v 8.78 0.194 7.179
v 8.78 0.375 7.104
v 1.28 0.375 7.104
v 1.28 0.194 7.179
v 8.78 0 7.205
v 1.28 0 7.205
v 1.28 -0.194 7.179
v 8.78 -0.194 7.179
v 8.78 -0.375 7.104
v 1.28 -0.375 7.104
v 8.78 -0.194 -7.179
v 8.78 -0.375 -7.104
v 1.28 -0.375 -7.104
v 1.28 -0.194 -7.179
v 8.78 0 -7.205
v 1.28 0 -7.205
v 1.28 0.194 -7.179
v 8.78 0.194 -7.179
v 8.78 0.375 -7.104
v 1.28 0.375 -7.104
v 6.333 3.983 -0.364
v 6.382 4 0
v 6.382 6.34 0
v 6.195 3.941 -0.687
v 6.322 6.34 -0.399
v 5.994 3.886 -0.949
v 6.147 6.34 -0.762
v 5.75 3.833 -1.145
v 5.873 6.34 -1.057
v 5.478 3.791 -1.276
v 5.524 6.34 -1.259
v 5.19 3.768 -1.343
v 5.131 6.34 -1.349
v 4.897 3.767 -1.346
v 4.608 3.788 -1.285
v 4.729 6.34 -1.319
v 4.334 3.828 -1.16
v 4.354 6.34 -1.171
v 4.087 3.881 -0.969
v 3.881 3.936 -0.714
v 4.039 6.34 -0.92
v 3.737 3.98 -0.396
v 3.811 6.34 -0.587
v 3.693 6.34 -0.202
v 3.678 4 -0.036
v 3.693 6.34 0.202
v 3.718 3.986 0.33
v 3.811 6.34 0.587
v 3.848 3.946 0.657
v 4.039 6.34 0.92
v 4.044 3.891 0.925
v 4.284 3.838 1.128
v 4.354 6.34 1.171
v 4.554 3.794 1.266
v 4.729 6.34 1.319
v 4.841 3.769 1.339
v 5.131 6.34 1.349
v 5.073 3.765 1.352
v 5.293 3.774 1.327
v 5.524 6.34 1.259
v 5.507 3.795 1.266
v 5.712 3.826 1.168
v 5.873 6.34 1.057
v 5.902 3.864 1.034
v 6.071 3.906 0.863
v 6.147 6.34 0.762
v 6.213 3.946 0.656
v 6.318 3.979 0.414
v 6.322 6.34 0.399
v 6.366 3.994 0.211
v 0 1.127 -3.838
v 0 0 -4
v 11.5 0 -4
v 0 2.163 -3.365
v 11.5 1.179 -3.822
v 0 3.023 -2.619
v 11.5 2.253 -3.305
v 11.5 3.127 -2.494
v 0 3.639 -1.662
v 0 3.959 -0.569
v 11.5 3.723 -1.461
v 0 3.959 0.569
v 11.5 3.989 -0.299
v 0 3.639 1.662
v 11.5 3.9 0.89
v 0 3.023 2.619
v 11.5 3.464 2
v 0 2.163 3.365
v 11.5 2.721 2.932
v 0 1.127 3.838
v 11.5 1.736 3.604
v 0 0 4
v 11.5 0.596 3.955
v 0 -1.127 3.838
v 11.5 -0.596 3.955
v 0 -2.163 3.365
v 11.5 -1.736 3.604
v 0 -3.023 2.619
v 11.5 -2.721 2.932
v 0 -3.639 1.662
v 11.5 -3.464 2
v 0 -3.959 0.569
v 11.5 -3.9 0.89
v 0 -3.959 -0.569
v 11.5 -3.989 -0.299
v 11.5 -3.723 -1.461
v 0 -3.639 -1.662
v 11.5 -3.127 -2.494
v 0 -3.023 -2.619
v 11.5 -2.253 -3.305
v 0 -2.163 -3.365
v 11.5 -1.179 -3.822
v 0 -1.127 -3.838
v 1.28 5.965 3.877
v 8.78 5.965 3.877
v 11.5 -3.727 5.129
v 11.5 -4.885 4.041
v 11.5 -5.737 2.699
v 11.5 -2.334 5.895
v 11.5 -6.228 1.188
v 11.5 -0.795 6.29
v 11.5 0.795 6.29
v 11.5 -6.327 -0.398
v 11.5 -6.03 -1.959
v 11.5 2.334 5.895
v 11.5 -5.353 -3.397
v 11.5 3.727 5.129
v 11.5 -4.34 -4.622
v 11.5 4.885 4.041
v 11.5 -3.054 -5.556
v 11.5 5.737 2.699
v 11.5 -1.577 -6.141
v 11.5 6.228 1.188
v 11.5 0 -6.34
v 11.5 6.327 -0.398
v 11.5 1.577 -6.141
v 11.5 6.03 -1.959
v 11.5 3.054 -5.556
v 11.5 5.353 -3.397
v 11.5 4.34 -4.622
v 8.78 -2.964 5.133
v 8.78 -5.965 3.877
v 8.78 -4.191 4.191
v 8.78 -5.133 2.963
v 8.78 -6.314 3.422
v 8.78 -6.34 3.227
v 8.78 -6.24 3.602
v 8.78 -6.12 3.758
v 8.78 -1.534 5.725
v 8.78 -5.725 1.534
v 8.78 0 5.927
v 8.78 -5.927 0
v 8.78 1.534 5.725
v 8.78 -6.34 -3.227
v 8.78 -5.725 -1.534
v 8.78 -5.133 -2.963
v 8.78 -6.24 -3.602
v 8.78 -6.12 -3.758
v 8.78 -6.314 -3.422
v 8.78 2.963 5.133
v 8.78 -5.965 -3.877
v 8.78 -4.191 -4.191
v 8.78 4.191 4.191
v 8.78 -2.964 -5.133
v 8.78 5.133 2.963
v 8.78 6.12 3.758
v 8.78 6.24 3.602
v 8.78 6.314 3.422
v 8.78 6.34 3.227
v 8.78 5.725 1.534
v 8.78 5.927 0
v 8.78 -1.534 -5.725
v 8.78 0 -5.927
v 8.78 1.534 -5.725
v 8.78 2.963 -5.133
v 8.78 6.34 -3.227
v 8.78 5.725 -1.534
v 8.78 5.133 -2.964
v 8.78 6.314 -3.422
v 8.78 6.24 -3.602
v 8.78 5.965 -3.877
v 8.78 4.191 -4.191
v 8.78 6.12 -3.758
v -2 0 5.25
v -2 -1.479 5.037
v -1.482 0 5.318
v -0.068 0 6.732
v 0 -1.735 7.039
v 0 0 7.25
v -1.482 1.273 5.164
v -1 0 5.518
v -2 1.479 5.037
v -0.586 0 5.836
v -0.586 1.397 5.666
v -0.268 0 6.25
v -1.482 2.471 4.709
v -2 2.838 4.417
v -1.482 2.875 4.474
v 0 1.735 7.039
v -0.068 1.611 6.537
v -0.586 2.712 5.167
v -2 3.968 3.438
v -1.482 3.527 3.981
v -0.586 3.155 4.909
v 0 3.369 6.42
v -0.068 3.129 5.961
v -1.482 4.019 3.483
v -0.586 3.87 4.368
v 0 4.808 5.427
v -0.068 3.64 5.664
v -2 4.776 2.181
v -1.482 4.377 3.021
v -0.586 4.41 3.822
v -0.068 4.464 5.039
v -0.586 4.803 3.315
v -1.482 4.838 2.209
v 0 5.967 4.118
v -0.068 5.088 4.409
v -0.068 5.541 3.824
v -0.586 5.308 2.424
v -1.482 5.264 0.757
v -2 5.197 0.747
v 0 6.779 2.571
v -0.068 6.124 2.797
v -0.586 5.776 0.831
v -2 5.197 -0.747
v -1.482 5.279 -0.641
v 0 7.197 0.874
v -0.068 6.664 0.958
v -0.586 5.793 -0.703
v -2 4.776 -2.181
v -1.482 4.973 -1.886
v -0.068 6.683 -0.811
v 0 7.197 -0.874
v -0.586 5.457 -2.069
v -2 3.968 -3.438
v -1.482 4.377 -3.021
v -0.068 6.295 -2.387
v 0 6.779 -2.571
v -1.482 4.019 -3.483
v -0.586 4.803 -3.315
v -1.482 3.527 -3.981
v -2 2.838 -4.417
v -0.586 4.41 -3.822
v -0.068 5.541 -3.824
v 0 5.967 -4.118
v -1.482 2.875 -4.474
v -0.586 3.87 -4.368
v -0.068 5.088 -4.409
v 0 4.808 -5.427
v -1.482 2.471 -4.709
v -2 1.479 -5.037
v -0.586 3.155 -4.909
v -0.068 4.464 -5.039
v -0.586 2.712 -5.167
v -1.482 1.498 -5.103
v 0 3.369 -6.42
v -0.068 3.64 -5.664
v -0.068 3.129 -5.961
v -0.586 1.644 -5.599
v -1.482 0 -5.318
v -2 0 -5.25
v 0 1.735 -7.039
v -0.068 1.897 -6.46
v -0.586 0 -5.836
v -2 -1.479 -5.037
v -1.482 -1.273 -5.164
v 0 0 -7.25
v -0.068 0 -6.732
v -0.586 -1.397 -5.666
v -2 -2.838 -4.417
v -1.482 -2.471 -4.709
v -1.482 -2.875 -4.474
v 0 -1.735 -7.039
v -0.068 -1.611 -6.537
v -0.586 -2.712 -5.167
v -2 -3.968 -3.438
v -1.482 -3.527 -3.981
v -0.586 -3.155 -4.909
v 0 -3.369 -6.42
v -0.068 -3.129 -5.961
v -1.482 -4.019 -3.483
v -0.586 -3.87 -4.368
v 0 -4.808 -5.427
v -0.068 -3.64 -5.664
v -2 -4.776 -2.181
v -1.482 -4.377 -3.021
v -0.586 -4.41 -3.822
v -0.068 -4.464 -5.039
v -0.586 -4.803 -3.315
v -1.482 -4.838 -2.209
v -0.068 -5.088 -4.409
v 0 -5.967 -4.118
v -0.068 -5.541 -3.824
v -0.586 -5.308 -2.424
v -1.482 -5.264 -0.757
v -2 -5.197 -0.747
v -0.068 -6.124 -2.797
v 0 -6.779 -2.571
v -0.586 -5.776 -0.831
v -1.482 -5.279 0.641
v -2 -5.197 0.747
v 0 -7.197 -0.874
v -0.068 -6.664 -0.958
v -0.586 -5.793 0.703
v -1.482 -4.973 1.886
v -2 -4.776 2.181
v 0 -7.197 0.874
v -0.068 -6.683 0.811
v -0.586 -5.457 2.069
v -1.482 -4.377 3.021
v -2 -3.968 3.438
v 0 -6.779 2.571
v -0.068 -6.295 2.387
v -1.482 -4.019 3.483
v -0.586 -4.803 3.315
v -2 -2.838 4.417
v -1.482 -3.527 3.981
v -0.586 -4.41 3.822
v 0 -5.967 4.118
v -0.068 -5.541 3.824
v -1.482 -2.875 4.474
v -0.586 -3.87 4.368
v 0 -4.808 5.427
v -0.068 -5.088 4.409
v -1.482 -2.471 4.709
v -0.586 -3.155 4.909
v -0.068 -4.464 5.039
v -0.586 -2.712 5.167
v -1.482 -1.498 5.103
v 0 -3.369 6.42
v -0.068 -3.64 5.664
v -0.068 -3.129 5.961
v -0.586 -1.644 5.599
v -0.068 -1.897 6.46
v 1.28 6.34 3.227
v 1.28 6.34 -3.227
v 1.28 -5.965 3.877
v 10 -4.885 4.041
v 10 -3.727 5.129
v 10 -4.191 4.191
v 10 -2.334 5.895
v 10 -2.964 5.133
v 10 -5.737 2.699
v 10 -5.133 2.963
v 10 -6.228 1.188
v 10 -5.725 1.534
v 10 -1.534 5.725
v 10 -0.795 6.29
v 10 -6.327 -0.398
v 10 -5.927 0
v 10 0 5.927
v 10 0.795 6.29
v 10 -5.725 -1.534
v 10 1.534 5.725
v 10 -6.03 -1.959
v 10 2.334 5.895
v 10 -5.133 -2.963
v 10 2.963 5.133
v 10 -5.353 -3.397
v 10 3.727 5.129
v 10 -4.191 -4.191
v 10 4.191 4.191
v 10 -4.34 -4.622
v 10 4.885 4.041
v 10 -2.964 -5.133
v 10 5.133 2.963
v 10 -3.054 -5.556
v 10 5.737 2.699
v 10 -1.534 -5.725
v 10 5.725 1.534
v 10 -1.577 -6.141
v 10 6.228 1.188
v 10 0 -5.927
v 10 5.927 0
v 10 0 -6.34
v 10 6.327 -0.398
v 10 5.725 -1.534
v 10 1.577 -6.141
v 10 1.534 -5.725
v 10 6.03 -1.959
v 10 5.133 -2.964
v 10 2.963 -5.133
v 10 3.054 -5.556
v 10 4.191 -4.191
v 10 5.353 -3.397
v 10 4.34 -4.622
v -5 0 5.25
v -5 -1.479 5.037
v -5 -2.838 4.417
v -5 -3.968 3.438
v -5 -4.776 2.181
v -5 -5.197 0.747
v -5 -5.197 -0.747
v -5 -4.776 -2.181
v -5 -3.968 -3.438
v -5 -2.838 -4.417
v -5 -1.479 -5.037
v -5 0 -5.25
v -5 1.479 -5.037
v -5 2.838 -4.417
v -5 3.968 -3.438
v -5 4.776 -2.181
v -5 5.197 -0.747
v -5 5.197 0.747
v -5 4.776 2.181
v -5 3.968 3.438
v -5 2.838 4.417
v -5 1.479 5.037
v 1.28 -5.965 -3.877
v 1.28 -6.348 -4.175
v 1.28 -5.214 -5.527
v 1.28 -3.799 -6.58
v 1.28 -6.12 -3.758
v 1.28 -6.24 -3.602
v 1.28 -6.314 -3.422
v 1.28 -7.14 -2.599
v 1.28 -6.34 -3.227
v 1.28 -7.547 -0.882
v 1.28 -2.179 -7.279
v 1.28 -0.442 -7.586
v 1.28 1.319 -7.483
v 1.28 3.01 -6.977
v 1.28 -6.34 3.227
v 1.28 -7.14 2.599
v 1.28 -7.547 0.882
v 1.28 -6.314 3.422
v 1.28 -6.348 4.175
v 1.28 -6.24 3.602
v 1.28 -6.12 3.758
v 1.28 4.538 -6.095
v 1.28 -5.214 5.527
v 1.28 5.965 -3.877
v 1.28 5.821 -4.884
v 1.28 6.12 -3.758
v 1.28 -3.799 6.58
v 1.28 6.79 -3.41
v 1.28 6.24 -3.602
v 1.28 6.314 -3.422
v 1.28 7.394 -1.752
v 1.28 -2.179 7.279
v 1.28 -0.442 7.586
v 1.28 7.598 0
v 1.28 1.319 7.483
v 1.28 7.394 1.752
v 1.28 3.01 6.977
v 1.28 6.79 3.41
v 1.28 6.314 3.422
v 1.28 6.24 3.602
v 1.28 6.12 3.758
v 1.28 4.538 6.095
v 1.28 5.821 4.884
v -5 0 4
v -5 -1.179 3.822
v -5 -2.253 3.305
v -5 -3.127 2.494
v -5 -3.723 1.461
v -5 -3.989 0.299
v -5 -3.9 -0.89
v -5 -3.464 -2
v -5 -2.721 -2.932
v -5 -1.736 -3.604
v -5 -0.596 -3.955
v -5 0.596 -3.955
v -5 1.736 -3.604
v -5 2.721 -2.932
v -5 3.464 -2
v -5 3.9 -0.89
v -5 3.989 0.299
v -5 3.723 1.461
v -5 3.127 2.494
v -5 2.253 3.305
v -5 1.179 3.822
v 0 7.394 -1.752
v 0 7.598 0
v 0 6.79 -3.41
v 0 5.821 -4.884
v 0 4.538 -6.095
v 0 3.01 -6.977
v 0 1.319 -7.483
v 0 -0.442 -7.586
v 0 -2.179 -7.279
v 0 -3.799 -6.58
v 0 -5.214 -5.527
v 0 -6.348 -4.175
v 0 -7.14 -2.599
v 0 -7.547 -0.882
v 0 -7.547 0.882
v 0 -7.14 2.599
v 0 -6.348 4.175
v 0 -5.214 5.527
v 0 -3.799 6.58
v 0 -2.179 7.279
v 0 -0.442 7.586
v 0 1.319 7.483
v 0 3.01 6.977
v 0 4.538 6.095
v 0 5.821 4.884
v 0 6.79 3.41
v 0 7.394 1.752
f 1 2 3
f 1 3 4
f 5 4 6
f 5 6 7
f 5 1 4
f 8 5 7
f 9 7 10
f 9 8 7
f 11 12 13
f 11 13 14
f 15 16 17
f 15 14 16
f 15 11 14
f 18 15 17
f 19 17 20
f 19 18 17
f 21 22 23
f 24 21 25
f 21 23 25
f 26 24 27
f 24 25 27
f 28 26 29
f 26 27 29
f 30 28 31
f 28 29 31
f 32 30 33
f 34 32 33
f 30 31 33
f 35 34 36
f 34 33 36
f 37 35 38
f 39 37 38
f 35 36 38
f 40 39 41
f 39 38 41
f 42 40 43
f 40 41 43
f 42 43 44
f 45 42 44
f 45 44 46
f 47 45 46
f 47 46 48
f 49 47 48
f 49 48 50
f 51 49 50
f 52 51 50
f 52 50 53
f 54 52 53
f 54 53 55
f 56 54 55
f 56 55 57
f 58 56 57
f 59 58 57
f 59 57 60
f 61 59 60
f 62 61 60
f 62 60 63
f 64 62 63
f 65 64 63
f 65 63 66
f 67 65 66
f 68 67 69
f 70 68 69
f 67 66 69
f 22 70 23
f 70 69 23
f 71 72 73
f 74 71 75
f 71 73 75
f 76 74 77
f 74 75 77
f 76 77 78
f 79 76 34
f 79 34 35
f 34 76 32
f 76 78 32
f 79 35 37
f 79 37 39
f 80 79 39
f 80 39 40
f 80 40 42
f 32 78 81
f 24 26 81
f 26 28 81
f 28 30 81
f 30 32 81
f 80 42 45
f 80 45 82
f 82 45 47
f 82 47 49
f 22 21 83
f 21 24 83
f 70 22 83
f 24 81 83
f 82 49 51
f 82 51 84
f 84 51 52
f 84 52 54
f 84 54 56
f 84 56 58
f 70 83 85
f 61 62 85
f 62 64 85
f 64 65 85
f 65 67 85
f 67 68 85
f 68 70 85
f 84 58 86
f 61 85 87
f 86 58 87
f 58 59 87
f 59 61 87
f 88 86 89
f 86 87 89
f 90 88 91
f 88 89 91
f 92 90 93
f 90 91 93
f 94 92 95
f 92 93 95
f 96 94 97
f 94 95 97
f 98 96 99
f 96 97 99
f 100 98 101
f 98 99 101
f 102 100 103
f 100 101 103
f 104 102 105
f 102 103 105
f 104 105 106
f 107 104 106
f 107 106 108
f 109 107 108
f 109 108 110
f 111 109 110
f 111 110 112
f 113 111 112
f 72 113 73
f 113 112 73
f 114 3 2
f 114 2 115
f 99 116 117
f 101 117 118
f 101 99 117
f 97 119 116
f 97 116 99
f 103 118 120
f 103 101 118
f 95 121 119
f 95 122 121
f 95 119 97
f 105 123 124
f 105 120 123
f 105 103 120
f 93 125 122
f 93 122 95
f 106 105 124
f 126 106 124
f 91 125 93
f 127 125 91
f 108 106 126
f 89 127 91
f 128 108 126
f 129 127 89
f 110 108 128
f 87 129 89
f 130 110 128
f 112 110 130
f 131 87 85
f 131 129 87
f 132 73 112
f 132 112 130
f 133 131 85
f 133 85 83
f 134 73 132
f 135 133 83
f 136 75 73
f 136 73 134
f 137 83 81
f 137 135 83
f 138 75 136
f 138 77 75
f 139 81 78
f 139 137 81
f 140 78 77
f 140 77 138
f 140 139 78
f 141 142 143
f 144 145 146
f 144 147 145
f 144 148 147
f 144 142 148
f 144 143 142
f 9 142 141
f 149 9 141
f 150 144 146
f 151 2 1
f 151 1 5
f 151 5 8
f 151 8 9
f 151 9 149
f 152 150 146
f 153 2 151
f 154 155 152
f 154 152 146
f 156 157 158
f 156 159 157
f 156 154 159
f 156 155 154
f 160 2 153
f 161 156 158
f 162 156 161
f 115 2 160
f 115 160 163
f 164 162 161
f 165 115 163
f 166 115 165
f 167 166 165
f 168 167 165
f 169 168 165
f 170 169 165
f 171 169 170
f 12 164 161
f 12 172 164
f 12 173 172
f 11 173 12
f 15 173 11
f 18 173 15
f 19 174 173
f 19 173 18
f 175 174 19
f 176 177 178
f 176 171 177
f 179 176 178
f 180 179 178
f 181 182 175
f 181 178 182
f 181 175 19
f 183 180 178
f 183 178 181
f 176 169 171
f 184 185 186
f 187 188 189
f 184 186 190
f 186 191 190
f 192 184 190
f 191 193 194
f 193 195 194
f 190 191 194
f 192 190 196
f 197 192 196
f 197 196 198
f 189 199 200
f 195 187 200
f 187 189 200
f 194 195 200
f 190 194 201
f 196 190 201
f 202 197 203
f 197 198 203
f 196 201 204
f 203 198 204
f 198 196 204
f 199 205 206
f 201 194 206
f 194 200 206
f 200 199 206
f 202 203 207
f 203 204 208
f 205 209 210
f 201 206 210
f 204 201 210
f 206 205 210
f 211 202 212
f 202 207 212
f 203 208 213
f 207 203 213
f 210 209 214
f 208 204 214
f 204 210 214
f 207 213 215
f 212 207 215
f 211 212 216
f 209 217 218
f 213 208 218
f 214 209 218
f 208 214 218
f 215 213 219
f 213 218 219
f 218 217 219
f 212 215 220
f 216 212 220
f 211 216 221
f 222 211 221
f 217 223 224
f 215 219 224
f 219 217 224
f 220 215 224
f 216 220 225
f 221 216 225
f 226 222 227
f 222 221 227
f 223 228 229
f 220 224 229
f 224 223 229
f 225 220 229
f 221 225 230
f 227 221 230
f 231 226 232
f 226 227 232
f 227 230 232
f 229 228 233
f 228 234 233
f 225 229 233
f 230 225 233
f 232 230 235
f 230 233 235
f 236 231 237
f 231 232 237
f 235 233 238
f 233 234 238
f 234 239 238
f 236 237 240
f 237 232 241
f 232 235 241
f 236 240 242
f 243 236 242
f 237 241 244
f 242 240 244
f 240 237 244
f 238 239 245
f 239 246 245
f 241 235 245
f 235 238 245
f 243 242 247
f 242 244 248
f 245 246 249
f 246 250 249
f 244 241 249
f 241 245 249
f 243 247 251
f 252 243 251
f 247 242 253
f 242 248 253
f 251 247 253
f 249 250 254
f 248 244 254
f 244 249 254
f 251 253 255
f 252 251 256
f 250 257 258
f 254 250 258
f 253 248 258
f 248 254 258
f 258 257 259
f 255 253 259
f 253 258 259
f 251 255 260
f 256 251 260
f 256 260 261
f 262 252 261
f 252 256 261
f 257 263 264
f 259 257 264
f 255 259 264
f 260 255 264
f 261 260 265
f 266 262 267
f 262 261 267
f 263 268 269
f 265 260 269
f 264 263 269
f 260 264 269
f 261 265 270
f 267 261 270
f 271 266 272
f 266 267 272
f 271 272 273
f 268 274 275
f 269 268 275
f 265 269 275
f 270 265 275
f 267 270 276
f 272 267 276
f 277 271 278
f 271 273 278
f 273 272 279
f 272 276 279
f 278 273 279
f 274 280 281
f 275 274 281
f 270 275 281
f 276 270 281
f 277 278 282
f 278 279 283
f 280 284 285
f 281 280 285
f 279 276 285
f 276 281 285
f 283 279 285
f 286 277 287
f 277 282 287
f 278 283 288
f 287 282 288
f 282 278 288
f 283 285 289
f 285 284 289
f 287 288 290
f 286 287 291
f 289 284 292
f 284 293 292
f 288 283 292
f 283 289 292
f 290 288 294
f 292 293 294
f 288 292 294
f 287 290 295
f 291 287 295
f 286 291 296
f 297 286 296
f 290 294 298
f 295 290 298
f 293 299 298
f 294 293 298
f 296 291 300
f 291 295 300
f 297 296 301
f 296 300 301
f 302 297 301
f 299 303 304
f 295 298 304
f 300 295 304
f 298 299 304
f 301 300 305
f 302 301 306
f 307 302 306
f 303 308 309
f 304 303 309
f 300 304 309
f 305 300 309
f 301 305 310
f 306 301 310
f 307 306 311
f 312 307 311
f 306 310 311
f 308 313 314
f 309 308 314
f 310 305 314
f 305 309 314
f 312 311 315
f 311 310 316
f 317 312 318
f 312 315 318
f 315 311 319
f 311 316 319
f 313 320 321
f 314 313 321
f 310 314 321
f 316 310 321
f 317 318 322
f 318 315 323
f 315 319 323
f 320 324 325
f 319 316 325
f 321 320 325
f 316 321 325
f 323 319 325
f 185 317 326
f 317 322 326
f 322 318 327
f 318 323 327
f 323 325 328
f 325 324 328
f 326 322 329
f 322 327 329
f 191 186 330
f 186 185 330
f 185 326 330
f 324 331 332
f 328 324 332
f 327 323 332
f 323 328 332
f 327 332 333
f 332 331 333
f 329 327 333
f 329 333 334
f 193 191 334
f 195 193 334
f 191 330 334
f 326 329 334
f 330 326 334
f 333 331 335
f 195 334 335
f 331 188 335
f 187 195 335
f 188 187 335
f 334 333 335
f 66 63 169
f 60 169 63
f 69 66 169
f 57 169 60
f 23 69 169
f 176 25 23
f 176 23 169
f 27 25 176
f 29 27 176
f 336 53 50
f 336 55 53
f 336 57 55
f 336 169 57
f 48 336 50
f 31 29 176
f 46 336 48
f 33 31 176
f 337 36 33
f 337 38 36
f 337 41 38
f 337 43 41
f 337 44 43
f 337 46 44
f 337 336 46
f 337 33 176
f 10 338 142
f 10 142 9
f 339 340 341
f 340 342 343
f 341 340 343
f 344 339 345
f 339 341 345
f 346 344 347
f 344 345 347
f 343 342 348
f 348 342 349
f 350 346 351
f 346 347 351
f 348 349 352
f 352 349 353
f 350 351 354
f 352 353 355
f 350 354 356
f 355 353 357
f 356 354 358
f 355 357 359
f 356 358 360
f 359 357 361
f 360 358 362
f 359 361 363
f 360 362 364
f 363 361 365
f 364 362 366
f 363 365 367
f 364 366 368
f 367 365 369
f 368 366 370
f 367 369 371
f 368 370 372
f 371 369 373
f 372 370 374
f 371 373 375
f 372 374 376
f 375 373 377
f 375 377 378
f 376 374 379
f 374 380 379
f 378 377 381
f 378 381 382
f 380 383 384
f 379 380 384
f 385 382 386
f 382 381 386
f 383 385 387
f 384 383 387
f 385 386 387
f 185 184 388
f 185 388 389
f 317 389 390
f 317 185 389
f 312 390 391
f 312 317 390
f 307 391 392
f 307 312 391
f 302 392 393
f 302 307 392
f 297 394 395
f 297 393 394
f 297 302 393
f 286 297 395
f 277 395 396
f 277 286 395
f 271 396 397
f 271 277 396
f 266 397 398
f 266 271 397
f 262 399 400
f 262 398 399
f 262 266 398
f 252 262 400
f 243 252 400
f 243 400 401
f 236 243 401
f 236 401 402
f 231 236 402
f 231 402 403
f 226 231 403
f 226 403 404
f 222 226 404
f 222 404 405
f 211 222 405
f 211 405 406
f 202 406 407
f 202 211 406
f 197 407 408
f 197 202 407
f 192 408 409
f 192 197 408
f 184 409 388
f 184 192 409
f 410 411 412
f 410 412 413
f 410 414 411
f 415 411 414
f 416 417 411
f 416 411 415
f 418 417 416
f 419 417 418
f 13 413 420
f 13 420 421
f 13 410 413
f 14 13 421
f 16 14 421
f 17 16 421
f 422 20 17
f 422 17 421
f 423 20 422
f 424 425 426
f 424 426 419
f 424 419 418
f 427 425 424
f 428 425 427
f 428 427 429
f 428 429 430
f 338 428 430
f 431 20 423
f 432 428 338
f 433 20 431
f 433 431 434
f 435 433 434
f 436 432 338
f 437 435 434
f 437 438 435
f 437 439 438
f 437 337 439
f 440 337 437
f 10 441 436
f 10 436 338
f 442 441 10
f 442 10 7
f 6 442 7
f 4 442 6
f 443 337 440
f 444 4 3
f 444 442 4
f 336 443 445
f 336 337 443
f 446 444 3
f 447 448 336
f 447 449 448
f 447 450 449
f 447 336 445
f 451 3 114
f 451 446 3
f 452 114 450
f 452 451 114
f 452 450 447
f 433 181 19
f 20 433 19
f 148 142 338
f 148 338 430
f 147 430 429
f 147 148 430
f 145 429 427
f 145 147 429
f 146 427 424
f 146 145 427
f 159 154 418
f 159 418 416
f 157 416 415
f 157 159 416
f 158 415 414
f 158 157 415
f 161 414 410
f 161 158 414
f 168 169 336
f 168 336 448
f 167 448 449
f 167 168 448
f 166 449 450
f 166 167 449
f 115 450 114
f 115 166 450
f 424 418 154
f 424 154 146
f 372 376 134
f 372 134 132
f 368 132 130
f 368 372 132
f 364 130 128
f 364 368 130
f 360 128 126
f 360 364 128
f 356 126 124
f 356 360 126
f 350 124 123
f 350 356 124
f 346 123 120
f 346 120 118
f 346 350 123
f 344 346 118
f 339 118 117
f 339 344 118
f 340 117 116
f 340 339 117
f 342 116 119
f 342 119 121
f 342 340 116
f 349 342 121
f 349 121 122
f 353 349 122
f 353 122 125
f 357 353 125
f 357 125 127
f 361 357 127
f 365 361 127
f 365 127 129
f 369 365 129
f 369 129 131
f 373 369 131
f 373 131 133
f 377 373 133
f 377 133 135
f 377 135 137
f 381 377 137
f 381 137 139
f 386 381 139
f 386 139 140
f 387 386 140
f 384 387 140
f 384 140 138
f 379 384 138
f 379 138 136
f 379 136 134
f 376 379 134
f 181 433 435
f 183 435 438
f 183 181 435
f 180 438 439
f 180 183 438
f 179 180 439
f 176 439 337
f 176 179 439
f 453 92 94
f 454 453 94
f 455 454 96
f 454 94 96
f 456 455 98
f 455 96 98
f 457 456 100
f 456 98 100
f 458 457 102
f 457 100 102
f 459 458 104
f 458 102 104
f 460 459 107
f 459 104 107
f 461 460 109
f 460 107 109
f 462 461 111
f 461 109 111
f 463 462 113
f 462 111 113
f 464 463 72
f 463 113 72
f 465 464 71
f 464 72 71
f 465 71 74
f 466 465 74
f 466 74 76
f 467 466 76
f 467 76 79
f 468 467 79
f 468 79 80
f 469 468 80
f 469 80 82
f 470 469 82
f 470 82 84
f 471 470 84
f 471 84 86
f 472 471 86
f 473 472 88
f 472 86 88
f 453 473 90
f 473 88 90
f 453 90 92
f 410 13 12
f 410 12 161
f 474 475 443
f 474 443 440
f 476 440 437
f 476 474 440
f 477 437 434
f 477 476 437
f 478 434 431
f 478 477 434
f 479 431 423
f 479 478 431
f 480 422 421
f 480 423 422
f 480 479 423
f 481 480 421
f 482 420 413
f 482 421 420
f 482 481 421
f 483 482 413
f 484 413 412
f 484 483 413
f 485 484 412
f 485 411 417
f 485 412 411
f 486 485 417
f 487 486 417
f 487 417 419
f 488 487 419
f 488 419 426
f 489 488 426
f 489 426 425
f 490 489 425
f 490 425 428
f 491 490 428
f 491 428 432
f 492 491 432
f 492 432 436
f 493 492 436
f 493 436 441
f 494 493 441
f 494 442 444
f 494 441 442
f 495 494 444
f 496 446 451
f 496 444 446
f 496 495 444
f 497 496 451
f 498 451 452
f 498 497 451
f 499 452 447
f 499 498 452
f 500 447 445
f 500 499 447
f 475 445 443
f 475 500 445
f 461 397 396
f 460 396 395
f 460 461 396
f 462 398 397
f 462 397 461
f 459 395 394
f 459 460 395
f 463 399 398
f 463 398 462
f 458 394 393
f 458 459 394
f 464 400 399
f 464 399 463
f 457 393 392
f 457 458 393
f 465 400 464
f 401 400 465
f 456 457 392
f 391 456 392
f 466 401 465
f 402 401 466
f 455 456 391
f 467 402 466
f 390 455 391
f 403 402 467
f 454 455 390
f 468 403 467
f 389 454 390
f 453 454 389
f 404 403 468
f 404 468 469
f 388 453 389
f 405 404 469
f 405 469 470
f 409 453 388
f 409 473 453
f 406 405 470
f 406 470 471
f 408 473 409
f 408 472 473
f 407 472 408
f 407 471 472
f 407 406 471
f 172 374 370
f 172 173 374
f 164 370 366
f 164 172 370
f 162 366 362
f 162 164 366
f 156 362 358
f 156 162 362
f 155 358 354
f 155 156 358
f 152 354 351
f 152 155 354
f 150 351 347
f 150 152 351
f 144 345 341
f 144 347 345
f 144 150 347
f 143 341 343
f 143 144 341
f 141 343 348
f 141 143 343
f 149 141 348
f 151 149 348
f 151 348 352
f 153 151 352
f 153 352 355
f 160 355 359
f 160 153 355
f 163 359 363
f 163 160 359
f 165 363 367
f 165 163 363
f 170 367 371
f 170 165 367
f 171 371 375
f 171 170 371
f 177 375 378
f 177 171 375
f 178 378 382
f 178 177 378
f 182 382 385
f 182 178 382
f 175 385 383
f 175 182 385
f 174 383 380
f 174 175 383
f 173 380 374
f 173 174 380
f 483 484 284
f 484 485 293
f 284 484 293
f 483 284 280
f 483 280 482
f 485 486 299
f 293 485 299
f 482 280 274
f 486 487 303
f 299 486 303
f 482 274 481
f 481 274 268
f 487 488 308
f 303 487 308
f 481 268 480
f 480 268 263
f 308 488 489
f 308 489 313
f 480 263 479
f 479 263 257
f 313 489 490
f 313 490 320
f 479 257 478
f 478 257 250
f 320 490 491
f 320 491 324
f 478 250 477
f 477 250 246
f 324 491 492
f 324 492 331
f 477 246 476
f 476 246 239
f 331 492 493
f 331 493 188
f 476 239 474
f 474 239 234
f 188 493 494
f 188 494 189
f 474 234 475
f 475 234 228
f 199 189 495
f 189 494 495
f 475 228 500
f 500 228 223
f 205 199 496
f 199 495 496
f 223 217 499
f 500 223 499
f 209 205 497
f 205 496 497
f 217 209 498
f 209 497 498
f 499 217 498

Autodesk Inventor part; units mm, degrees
ref_plane "YZ Plane" through (0, 0, 0) normal (1, 0, 0) x (0, 1, 0)
ref_plane "XZ Plane" through (0, 0, 0) normal (0, 1, 0) x (-1, 0, 0)
ref_plane "XY Plane" through (0, 0, 0) normal (0, 0, 1) x (1, 0, 0)
sketch "Sketch1" plane through (0, 0, 0) normal (1, 0, 0) x (0, 1, 0)
  circle A0 centre (0, 0) radius 7.5985
  dimension "d0" = 15.197
extrude "Extrusion1" add sketch "Sketch1" along normal blind 1.28
sketch "Sketch2" plane through (1.28, 0, 0) normal (1, 0, 0) x (0, 0, -1)
  line L0 (3.6604, 6.34) -> (7.3208, 0)
  line L1 (7.3208, 0) -> (3.6604, -6.34)
  line L2 (3.6604, -6.34) -> (-3.6604, -6.34)
  line L3 (-3.6604, -6.34) -> (-7.3208, 0)
  line L4 (-7.3208, 0) -> (-3.6604, 6.34)
  line L5 (-3.6604, 6.34) -> (3.6604, 6.34)
  point P0 (0, 0)
  point P1 (0, 6.34)
  point P2 (0, 0)
extrude "Extrusion2" add sketch "Sketch2" along normal blind 7.5
sketch "Sketch3" plane through (8.78, 0, 0) normal (1, 0, 0) x (0, 0, -1)
  circle A0 centre (0, 0) radius 5.927
  dimension "d5" = 11.854
extrude "Extrusion3" add sketch "Sketch3" along normal blind 1.22
sketch "Sketch4" plane through (10, 0, 0) normal (1, 0, 0) x (0, 0, -1)
  circle A0 centre (0, 0) radius 6.34
  line L0 (3.6604, 6.34) -> (-3.6604, 6.34) projected
extrude "Extrusion4" add sketch "Sketch4" along normal blind 1.5
fillet "Fillet1" radius 0.75 5 edges at (5.03, 0, -7.3208) (5.03, -6.34, -3.6604) (5.03, 0, 7.3208) (5.03, 6.34, -3.6604) (5.03, 6.34, 3.6604)
fillet "Fillet2" radius 0.75 1 edges at (5.03, -6.34, 3.6604)
sketch "Sketch5" plane through (0, 0, 0) normal (-1, 0, 0) x (0, 0, 1)
  point P0 (0, 0)
sketch "Sketch6" plane through (1.28, 6.34, 3.2274) normal (0, 1, 0) x (1, 0, 0)
  circle A0 centre (3.75, 3.2274) radius 1.3525
  point P0 (-1.28, 3.2274)
  dimension "d12" = 2.705
extrude "Extrusion5" cut sketch "Sketch6" against normal blind 6.5
sketch "Sketch7" plane through (0, 0, 0) normal (-1, 0, 0) x (0, 0, 1)
  circle A0 centre (0, 0) radius 3.2
  dimension "d15" = 6.4
sketch "Sketch8" plane through (5.03, -0.16, 0) normal (0, 1, 0) x (1, 0, 0)
  point P0 (-5.03, 0)
extrude "Extrusion6" cut sketch "Sketch7" against normal blind 11.75
sketch "Sketch9" plane through (11.5, 0, 0) normal (1, 0, 0) x (0, 0, -1)
  circle A0 centre (0, 0) radius 4
  dimension "d18" = 8
extrude "Extrusion7" cut sketch "Sketch9" against normal blind 13.75
sketch "Sketch10" plane through (0, 0, 0) normal (-1, 0, 0) x (0, 0, 1)
  circle A0 centre (0, 0) radius 4
  circle A1 centre (0, 0) radius 5.25
  dimension "d21" = 10.5
extrude "Extrusion8" add sketch "Sketch10" along normal blind 5
fillet "Fillet3" radius 2 1 edges at (0, 0, -5.25)
properties part number "_3DPrint"
